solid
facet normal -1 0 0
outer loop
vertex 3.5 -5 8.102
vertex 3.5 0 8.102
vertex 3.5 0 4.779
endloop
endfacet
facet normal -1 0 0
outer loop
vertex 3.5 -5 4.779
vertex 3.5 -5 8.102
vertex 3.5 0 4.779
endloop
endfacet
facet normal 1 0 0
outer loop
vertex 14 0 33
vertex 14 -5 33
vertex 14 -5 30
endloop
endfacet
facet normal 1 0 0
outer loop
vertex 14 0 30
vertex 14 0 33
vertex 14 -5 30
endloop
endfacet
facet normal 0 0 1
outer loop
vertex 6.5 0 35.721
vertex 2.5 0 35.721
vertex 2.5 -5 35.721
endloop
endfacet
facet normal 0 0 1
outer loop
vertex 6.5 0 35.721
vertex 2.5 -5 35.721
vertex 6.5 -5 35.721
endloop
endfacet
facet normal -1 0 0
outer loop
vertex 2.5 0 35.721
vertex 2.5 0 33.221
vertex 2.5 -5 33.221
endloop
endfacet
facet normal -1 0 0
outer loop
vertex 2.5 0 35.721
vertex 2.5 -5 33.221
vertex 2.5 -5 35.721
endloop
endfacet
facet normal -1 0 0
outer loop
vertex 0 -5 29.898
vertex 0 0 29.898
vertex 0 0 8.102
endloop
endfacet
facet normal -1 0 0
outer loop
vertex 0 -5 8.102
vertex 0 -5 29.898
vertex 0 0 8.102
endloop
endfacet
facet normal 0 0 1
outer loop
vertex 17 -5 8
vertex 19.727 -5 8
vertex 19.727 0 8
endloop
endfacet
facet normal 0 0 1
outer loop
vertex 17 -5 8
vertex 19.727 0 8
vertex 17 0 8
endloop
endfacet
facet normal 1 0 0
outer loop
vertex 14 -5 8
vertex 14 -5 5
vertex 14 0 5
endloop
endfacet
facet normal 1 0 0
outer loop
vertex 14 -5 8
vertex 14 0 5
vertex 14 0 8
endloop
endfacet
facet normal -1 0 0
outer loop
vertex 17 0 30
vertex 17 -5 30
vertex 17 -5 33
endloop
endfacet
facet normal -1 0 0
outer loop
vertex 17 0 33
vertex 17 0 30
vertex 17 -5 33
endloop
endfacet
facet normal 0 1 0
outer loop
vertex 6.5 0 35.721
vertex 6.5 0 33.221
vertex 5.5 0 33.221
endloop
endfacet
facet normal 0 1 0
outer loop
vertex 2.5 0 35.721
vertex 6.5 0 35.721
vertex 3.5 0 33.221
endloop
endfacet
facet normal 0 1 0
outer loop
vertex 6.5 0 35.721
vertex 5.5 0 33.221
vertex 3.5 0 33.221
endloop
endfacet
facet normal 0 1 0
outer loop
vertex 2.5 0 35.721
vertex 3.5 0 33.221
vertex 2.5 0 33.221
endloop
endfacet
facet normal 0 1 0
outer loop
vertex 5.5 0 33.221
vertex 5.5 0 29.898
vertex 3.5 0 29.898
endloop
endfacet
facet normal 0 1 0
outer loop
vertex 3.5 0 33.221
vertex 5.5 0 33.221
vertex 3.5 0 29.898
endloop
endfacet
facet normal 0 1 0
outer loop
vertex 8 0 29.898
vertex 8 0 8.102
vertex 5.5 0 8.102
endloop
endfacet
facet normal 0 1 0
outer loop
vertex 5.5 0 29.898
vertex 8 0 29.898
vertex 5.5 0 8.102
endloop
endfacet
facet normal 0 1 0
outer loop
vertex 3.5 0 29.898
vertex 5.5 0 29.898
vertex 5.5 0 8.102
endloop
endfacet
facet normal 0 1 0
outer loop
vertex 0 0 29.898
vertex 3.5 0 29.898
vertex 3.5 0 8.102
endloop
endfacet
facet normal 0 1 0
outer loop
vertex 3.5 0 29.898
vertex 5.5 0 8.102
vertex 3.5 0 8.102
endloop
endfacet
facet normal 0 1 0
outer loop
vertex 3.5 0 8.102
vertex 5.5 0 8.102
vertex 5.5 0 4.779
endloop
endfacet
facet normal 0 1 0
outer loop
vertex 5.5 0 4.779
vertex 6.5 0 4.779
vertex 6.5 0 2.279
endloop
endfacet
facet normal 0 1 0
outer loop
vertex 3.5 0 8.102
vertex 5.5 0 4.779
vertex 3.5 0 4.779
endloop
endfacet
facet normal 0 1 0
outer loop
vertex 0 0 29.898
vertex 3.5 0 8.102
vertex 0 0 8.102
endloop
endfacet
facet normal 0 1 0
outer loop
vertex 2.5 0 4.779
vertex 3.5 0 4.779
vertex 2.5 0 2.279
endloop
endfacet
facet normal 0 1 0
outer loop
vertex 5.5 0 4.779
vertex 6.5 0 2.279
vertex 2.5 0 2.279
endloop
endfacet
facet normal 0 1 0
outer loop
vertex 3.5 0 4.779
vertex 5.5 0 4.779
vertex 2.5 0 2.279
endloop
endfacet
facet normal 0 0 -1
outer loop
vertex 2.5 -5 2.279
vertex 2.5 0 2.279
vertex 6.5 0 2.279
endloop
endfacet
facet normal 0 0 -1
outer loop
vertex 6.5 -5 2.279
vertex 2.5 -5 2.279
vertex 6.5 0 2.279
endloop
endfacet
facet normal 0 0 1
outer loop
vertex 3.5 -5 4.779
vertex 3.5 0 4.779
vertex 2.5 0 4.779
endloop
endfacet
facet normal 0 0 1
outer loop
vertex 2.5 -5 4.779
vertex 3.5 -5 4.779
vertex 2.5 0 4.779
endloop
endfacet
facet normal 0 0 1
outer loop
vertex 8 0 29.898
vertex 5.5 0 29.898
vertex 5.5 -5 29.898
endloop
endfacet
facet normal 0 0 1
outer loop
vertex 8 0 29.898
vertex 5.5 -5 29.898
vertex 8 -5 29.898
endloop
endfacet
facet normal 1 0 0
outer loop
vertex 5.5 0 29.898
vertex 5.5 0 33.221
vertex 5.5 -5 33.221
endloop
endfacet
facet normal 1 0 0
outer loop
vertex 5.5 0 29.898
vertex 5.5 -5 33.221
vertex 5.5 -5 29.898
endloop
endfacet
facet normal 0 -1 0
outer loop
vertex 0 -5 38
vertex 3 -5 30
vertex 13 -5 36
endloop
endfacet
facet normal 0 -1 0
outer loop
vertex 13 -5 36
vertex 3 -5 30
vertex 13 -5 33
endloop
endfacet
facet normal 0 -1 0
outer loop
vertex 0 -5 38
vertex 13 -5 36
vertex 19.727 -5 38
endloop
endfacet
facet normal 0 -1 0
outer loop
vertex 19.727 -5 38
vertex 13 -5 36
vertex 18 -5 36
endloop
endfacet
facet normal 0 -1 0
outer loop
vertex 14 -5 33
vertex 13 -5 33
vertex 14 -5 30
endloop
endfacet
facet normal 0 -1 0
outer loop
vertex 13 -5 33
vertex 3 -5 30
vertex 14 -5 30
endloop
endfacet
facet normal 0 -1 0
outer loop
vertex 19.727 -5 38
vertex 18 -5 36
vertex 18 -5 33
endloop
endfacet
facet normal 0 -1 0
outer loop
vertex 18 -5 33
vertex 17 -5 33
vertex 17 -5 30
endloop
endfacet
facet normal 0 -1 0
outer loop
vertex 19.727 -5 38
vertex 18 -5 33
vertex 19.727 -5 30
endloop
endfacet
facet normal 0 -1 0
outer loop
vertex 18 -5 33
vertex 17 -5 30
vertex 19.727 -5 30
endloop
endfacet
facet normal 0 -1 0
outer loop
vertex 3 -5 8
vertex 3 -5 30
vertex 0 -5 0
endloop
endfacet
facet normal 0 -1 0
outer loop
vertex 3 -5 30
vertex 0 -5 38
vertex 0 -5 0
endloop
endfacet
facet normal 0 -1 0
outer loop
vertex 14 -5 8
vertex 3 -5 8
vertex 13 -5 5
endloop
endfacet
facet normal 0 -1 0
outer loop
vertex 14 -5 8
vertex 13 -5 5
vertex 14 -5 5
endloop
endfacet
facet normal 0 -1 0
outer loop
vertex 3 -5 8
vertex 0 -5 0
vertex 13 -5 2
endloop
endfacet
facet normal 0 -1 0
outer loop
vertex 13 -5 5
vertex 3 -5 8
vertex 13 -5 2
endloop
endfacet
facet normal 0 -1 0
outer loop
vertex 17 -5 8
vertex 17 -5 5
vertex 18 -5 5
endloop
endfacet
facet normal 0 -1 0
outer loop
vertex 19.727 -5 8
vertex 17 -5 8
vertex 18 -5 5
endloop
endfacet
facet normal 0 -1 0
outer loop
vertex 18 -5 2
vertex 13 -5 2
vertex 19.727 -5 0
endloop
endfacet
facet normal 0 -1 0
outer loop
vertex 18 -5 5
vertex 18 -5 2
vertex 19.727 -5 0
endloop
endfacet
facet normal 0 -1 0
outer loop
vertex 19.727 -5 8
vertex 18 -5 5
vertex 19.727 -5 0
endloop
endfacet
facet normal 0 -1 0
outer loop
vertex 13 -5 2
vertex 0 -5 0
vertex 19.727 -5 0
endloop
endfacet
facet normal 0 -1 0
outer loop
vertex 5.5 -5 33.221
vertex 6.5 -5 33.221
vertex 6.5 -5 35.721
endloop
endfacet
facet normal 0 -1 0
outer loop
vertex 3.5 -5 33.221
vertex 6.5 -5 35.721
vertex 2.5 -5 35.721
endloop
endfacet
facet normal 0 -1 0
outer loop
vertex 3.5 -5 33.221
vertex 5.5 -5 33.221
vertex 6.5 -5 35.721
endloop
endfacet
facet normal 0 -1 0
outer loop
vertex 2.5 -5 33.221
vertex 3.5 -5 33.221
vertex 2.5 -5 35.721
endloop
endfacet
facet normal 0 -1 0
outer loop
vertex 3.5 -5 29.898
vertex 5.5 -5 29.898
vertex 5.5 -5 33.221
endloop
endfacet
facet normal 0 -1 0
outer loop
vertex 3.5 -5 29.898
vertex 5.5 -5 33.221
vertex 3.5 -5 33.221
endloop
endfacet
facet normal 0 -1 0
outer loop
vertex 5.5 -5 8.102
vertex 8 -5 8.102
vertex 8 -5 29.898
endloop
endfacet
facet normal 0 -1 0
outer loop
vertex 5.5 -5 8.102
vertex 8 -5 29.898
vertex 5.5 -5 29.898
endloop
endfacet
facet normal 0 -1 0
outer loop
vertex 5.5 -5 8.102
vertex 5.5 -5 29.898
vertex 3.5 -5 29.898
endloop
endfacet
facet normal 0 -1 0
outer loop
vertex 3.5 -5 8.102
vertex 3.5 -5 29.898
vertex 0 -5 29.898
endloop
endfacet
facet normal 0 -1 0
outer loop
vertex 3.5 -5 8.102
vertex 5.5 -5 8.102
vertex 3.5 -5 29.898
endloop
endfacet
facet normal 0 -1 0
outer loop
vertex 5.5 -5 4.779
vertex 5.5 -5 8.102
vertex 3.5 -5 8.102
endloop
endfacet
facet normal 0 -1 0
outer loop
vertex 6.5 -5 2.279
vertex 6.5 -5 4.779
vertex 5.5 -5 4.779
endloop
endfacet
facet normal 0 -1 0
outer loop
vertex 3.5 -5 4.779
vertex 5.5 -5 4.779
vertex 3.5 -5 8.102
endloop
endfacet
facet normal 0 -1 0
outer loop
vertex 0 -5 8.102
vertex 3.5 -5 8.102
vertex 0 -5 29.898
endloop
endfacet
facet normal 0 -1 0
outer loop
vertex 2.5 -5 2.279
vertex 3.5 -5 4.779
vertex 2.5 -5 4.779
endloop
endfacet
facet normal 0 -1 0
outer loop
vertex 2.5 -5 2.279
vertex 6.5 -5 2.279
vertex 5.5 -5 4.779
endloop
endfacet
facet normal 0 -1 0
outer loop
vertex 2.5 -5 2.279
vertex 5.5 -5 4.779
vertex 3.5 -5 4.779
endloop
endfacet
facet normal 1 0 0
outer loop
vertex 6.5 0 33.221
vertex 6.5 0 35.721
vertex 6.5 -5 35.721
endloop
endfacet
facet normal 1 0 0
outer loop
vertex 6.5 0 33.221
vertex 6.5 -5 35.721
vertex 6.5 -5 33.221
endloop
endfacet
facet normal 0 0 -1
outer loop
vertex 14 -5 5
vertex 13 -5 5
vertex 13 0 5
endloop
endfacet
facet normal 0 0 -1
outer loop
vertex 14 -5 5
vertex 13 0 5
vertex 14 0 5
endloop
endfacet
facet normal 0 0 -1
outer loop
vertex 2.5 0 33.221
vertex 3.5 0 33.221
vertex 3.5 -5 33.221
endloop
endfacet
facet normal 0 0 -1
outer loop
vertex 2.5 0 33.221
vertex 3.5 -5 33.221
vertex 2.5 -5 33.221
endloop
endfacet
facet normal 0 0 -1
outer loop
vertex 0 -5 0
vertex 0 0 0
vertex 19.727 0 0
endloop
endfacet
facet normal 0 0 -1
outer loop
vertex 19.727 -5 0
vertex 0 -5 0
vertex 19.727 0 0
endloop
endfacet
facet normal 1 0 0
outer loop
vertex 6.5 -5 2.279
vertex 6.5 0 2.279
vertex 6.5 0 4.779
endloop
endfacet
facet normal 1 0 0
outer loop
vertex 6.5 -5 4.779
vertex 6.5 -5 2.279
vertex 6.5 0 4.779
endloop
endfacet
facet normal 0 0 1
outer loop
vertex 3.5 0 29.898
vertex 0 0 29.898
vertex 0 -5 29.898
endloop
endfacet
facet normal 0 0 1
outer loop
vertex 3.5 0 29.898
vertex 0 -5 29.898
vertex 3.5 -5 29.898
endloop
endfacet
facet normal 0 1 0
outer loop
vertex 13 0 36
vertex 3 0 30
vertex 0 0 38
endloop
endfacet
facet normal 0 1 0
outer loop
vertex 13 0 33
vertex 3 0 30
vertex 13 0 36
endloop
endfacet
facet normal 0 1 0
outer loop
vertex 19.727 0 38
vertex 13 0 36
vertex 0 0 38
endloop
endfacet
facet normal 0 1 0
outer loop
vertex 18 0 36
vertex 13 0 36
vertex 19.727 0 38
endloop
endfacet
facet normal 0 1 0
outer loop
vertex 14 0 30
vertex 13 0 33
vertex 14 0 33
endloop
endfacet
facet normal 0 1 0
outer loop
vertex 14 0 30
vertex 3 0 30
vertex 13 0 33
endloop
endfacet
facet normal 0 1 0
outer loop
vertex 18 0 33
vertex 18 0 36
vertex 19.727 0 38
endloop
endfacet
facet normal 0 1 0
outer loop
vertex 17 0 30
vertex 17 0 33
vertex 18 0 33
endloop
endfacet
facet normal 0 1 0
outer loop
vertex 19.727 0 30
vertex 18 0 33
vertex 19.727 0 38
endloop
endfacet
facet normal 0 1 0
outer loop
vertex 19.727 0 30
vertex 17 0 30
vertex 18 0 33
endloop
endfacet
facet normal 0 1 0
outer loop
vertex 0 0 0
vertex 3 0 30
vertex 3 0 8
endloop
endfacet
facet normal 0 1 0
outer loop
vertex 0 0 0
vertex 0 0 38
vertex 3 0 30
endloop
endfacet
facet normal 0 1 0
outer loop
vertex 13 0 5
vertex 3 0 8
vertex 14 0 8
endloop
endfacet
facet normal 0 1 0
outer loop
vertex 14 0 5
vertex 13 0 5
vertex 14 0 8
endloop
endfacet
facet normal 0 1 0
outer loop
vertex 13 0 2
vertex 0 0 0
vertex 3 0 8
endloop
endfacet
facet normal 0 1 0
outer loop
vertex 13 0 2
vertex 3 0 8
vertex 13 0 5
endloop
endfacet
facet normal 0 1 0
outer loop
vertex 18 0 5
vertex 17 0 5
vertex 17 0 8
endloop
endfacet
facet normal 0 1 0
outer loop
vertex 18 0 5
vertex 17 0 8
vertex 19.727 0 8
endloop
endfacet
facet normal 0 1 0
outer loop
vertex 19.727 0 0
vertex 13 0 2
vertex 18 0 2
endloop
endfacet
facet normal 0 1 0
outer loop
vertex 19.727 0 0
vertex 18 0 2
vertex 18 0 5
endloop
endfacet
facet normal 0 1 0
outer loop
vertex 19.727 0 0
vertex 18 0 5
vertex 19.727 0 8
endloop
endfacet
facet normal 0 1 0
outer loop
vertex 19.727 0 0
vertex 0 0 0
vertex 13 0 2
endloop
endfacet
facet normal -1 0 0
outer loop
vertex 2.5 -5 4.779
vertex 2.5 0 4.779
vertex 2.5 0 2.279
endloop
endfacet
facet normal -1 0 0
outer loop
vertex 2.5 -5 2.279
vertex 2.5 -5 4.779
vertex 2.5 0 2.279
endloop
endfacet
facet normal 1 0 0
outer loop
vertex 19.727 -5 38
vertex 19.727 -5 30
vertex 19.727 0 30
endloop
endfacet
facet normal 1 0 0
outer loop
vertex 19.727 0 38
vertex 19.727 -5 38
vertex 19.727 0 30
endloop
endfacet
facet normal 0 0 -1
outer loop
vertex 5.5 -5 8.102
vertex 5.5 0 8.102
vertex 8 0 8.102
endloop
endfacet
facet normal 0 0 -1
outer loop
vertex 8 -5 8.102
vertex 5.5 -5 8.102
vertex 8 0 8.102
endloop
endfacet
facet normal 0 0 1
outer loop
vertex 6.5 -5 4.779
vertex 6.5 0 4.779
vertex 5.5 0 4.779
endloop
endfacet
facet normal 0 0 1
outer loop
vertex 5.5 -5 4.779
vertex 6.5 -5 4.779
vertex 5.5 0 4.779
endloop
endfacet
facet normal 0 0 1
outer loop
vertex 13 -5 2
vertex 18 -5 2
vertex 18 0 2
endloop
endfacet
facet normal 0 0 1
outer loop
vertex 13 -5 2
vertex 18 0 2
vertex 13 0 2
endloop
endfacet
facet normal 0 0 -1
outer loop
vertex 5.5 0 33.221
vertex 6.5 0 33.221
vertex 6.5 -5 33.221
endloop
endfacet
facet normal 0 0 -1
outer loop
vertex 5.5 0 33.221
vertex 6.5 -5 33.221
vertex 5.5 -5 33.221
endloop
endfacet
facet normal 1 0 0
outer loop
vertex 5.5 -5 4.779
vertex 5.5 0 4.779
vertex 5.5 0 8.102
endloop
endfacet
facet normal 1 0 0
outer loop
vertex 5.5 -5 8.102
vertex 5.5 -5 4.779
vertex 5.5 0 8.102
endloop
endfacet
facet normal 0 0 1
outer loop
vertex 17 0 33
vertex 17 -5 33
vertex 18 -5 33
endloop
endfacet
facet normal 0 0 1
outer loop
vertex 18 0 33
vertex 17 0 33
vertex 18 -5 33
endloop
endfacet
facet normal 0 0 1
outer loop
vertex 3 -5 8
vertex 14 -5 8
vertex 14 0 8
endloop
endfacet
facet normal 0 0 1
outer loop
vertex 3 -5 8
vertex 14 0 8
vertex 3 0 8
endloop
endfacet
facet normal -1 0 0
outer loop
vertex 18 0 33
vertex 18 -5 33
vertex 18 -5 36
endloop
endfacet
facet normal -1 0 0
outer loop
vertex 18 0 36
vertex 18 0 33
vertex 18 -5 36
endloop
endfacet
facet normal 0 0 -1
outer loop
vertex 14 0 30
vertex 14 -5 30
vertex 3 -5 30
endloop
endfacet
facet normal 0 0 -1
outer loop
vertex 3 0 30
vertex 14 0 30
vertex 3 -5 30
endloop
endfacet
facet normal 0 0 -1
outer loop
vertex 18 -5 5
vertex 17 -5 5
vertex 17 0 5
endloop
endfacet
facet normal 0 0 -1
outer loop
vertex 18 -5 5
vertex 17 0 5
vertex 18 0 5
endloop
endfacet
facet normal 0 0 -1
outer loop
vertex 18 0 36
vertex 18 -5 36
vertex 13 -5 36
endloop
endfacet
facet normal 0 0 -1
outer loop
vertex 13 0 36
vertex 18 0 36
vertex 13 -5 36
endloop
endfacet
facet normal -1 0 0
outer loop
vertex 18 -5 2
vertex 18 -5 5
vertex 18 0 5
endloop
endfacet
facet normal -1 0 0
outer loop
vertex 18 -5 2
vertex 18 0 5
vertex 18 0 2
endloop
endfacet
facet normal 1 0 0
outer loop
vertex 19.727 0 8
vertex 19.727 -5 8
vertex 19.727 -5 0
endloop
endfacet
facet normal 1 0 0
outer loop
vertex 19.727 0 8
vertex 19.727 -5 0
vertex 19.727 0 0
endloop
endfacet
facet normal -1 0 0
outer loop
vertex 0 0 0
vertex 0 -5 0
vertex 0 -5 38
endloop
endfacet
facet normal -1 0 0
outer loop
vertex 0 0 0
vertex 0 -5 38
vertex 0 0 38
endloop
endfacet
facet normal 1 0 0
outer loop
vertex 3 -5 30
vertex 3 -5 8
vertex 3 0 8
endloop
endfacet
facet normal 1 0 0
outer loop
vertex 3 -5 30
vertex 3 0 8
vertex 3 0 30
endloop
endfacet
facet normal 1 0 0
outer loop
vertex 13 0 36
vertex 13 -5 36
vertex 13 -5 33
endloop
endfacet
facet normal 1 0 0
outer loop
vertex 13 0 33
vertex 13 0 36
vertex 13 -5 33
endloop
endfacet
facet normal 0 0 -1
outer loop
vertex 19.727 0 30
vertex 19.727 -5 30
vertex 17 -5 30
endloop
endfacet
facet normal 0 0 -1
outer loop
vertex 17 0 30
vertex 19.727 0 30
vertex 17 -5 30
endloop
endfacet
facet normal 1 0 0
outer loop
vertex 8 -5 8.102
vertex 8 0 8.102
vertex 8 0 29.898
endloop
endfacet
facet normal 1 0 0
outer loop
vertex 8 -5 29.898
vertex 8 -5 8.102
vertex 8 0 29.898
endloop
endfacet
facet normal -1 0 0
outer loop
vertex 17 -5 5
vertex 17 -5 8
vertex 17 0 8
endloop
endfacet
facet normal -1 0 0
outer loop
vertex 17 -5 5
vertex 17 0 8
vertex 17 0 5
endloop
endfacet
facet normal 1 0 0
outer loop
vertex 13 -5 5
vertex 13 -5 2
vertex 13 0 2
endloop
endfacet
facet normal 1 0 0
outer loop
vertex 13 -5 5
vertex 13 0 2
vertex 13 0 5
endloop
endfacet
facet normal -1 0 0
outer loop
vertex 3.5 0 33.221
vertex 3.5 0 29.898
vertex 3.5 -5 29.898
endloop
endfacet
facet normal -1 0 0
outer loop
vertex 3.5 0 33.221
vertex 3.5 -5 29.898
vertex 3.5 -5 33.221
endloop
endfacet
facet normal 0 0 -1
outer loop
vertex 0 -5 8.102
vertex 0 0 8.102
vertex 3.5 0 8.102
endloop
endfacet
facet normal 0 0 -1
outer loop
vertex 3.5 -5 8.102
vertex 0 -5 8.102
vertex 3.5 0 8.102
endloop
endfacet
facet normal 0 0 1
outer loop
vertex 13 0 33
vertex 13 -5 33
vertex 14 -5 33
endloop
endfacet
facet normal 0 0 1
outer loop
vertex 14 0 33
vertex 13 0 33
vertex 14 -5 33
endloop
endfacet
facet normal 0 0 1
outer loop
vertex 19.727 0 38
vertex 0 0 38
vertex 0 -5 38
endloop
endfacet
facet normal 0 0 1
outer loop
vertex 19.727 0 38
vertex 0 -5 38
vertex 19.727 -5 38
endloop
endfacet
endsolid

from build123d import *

# Parameters (mm, degrees)
SKETCH_W     = 19.727158
SKETCH_H     = 5
PAD_DEPTH    = 38
POCKET_DEPTH = 91.213778
PAD001_DEPTH = 5


with BuildPart() as body:
    # Sketch → Pad (new body)
    with BuildSketch(Plane.XY):
        with Locations((9.863579, -2.5)):
            Rectangle(SKETCH_W, SKETCH_H)
    extrude(amount=PAD_DEPTH)

    # Sketch001 (on DatumPlane) → Pocket (cut, through all)
    with BuildSketch(Plane(origin=(20, -5, 30), x_dir=(0, 0, 1), z_dir=(0, -1, 0))):
        Polygon((0, 17), (-11, 17), (-11, 0), (0, 0), (0, 3), (3, 3), (3, 2), (6, 2), (6, 7), (3, 7), (3, 6), (0, 6), (0, 8), align=None)
    pocket = extrude(amount=-POCKET_DEPTH, mode=Mode.SUBTRACT)

    # Mirrored: Pocket across Sketch001 Axis3
    add(pocket.mirror(Plane(origin=(-21.528492, -5, 19), x_dir=(0, -1, 0), z_dir=(0, 0, 1))), mode=Mode.SUBTRACT)


with BuildPart() as fermeture:
    # Sketch004 → Pad001 (new body)
    with BuildSketch(Plane.XZ):
        Polygon((0, 29.897505), (3.5, 29.897505), (3.5, 33.221244), (2.5, 33.221244), (2.5, 35.721244), (6.5, 35.721244), (6.5, 33.221244), (5.5, 33.221244), (5.5, 29.897505), (8, 29.897505), (8, 19), (0, 19), align=None)
    pad001 = extrude(amount=PAD001_DEPTH)

    # Mirrored001: Pad001 across Sketch004 Axis2
    add(pad001.mirror(Plane(origin=(-14.053349, 0, 19), x_dir=(0, -1, 0), z_dir=(0, 0, 1))))


solid = Compound([body.part, fermeture.part])
